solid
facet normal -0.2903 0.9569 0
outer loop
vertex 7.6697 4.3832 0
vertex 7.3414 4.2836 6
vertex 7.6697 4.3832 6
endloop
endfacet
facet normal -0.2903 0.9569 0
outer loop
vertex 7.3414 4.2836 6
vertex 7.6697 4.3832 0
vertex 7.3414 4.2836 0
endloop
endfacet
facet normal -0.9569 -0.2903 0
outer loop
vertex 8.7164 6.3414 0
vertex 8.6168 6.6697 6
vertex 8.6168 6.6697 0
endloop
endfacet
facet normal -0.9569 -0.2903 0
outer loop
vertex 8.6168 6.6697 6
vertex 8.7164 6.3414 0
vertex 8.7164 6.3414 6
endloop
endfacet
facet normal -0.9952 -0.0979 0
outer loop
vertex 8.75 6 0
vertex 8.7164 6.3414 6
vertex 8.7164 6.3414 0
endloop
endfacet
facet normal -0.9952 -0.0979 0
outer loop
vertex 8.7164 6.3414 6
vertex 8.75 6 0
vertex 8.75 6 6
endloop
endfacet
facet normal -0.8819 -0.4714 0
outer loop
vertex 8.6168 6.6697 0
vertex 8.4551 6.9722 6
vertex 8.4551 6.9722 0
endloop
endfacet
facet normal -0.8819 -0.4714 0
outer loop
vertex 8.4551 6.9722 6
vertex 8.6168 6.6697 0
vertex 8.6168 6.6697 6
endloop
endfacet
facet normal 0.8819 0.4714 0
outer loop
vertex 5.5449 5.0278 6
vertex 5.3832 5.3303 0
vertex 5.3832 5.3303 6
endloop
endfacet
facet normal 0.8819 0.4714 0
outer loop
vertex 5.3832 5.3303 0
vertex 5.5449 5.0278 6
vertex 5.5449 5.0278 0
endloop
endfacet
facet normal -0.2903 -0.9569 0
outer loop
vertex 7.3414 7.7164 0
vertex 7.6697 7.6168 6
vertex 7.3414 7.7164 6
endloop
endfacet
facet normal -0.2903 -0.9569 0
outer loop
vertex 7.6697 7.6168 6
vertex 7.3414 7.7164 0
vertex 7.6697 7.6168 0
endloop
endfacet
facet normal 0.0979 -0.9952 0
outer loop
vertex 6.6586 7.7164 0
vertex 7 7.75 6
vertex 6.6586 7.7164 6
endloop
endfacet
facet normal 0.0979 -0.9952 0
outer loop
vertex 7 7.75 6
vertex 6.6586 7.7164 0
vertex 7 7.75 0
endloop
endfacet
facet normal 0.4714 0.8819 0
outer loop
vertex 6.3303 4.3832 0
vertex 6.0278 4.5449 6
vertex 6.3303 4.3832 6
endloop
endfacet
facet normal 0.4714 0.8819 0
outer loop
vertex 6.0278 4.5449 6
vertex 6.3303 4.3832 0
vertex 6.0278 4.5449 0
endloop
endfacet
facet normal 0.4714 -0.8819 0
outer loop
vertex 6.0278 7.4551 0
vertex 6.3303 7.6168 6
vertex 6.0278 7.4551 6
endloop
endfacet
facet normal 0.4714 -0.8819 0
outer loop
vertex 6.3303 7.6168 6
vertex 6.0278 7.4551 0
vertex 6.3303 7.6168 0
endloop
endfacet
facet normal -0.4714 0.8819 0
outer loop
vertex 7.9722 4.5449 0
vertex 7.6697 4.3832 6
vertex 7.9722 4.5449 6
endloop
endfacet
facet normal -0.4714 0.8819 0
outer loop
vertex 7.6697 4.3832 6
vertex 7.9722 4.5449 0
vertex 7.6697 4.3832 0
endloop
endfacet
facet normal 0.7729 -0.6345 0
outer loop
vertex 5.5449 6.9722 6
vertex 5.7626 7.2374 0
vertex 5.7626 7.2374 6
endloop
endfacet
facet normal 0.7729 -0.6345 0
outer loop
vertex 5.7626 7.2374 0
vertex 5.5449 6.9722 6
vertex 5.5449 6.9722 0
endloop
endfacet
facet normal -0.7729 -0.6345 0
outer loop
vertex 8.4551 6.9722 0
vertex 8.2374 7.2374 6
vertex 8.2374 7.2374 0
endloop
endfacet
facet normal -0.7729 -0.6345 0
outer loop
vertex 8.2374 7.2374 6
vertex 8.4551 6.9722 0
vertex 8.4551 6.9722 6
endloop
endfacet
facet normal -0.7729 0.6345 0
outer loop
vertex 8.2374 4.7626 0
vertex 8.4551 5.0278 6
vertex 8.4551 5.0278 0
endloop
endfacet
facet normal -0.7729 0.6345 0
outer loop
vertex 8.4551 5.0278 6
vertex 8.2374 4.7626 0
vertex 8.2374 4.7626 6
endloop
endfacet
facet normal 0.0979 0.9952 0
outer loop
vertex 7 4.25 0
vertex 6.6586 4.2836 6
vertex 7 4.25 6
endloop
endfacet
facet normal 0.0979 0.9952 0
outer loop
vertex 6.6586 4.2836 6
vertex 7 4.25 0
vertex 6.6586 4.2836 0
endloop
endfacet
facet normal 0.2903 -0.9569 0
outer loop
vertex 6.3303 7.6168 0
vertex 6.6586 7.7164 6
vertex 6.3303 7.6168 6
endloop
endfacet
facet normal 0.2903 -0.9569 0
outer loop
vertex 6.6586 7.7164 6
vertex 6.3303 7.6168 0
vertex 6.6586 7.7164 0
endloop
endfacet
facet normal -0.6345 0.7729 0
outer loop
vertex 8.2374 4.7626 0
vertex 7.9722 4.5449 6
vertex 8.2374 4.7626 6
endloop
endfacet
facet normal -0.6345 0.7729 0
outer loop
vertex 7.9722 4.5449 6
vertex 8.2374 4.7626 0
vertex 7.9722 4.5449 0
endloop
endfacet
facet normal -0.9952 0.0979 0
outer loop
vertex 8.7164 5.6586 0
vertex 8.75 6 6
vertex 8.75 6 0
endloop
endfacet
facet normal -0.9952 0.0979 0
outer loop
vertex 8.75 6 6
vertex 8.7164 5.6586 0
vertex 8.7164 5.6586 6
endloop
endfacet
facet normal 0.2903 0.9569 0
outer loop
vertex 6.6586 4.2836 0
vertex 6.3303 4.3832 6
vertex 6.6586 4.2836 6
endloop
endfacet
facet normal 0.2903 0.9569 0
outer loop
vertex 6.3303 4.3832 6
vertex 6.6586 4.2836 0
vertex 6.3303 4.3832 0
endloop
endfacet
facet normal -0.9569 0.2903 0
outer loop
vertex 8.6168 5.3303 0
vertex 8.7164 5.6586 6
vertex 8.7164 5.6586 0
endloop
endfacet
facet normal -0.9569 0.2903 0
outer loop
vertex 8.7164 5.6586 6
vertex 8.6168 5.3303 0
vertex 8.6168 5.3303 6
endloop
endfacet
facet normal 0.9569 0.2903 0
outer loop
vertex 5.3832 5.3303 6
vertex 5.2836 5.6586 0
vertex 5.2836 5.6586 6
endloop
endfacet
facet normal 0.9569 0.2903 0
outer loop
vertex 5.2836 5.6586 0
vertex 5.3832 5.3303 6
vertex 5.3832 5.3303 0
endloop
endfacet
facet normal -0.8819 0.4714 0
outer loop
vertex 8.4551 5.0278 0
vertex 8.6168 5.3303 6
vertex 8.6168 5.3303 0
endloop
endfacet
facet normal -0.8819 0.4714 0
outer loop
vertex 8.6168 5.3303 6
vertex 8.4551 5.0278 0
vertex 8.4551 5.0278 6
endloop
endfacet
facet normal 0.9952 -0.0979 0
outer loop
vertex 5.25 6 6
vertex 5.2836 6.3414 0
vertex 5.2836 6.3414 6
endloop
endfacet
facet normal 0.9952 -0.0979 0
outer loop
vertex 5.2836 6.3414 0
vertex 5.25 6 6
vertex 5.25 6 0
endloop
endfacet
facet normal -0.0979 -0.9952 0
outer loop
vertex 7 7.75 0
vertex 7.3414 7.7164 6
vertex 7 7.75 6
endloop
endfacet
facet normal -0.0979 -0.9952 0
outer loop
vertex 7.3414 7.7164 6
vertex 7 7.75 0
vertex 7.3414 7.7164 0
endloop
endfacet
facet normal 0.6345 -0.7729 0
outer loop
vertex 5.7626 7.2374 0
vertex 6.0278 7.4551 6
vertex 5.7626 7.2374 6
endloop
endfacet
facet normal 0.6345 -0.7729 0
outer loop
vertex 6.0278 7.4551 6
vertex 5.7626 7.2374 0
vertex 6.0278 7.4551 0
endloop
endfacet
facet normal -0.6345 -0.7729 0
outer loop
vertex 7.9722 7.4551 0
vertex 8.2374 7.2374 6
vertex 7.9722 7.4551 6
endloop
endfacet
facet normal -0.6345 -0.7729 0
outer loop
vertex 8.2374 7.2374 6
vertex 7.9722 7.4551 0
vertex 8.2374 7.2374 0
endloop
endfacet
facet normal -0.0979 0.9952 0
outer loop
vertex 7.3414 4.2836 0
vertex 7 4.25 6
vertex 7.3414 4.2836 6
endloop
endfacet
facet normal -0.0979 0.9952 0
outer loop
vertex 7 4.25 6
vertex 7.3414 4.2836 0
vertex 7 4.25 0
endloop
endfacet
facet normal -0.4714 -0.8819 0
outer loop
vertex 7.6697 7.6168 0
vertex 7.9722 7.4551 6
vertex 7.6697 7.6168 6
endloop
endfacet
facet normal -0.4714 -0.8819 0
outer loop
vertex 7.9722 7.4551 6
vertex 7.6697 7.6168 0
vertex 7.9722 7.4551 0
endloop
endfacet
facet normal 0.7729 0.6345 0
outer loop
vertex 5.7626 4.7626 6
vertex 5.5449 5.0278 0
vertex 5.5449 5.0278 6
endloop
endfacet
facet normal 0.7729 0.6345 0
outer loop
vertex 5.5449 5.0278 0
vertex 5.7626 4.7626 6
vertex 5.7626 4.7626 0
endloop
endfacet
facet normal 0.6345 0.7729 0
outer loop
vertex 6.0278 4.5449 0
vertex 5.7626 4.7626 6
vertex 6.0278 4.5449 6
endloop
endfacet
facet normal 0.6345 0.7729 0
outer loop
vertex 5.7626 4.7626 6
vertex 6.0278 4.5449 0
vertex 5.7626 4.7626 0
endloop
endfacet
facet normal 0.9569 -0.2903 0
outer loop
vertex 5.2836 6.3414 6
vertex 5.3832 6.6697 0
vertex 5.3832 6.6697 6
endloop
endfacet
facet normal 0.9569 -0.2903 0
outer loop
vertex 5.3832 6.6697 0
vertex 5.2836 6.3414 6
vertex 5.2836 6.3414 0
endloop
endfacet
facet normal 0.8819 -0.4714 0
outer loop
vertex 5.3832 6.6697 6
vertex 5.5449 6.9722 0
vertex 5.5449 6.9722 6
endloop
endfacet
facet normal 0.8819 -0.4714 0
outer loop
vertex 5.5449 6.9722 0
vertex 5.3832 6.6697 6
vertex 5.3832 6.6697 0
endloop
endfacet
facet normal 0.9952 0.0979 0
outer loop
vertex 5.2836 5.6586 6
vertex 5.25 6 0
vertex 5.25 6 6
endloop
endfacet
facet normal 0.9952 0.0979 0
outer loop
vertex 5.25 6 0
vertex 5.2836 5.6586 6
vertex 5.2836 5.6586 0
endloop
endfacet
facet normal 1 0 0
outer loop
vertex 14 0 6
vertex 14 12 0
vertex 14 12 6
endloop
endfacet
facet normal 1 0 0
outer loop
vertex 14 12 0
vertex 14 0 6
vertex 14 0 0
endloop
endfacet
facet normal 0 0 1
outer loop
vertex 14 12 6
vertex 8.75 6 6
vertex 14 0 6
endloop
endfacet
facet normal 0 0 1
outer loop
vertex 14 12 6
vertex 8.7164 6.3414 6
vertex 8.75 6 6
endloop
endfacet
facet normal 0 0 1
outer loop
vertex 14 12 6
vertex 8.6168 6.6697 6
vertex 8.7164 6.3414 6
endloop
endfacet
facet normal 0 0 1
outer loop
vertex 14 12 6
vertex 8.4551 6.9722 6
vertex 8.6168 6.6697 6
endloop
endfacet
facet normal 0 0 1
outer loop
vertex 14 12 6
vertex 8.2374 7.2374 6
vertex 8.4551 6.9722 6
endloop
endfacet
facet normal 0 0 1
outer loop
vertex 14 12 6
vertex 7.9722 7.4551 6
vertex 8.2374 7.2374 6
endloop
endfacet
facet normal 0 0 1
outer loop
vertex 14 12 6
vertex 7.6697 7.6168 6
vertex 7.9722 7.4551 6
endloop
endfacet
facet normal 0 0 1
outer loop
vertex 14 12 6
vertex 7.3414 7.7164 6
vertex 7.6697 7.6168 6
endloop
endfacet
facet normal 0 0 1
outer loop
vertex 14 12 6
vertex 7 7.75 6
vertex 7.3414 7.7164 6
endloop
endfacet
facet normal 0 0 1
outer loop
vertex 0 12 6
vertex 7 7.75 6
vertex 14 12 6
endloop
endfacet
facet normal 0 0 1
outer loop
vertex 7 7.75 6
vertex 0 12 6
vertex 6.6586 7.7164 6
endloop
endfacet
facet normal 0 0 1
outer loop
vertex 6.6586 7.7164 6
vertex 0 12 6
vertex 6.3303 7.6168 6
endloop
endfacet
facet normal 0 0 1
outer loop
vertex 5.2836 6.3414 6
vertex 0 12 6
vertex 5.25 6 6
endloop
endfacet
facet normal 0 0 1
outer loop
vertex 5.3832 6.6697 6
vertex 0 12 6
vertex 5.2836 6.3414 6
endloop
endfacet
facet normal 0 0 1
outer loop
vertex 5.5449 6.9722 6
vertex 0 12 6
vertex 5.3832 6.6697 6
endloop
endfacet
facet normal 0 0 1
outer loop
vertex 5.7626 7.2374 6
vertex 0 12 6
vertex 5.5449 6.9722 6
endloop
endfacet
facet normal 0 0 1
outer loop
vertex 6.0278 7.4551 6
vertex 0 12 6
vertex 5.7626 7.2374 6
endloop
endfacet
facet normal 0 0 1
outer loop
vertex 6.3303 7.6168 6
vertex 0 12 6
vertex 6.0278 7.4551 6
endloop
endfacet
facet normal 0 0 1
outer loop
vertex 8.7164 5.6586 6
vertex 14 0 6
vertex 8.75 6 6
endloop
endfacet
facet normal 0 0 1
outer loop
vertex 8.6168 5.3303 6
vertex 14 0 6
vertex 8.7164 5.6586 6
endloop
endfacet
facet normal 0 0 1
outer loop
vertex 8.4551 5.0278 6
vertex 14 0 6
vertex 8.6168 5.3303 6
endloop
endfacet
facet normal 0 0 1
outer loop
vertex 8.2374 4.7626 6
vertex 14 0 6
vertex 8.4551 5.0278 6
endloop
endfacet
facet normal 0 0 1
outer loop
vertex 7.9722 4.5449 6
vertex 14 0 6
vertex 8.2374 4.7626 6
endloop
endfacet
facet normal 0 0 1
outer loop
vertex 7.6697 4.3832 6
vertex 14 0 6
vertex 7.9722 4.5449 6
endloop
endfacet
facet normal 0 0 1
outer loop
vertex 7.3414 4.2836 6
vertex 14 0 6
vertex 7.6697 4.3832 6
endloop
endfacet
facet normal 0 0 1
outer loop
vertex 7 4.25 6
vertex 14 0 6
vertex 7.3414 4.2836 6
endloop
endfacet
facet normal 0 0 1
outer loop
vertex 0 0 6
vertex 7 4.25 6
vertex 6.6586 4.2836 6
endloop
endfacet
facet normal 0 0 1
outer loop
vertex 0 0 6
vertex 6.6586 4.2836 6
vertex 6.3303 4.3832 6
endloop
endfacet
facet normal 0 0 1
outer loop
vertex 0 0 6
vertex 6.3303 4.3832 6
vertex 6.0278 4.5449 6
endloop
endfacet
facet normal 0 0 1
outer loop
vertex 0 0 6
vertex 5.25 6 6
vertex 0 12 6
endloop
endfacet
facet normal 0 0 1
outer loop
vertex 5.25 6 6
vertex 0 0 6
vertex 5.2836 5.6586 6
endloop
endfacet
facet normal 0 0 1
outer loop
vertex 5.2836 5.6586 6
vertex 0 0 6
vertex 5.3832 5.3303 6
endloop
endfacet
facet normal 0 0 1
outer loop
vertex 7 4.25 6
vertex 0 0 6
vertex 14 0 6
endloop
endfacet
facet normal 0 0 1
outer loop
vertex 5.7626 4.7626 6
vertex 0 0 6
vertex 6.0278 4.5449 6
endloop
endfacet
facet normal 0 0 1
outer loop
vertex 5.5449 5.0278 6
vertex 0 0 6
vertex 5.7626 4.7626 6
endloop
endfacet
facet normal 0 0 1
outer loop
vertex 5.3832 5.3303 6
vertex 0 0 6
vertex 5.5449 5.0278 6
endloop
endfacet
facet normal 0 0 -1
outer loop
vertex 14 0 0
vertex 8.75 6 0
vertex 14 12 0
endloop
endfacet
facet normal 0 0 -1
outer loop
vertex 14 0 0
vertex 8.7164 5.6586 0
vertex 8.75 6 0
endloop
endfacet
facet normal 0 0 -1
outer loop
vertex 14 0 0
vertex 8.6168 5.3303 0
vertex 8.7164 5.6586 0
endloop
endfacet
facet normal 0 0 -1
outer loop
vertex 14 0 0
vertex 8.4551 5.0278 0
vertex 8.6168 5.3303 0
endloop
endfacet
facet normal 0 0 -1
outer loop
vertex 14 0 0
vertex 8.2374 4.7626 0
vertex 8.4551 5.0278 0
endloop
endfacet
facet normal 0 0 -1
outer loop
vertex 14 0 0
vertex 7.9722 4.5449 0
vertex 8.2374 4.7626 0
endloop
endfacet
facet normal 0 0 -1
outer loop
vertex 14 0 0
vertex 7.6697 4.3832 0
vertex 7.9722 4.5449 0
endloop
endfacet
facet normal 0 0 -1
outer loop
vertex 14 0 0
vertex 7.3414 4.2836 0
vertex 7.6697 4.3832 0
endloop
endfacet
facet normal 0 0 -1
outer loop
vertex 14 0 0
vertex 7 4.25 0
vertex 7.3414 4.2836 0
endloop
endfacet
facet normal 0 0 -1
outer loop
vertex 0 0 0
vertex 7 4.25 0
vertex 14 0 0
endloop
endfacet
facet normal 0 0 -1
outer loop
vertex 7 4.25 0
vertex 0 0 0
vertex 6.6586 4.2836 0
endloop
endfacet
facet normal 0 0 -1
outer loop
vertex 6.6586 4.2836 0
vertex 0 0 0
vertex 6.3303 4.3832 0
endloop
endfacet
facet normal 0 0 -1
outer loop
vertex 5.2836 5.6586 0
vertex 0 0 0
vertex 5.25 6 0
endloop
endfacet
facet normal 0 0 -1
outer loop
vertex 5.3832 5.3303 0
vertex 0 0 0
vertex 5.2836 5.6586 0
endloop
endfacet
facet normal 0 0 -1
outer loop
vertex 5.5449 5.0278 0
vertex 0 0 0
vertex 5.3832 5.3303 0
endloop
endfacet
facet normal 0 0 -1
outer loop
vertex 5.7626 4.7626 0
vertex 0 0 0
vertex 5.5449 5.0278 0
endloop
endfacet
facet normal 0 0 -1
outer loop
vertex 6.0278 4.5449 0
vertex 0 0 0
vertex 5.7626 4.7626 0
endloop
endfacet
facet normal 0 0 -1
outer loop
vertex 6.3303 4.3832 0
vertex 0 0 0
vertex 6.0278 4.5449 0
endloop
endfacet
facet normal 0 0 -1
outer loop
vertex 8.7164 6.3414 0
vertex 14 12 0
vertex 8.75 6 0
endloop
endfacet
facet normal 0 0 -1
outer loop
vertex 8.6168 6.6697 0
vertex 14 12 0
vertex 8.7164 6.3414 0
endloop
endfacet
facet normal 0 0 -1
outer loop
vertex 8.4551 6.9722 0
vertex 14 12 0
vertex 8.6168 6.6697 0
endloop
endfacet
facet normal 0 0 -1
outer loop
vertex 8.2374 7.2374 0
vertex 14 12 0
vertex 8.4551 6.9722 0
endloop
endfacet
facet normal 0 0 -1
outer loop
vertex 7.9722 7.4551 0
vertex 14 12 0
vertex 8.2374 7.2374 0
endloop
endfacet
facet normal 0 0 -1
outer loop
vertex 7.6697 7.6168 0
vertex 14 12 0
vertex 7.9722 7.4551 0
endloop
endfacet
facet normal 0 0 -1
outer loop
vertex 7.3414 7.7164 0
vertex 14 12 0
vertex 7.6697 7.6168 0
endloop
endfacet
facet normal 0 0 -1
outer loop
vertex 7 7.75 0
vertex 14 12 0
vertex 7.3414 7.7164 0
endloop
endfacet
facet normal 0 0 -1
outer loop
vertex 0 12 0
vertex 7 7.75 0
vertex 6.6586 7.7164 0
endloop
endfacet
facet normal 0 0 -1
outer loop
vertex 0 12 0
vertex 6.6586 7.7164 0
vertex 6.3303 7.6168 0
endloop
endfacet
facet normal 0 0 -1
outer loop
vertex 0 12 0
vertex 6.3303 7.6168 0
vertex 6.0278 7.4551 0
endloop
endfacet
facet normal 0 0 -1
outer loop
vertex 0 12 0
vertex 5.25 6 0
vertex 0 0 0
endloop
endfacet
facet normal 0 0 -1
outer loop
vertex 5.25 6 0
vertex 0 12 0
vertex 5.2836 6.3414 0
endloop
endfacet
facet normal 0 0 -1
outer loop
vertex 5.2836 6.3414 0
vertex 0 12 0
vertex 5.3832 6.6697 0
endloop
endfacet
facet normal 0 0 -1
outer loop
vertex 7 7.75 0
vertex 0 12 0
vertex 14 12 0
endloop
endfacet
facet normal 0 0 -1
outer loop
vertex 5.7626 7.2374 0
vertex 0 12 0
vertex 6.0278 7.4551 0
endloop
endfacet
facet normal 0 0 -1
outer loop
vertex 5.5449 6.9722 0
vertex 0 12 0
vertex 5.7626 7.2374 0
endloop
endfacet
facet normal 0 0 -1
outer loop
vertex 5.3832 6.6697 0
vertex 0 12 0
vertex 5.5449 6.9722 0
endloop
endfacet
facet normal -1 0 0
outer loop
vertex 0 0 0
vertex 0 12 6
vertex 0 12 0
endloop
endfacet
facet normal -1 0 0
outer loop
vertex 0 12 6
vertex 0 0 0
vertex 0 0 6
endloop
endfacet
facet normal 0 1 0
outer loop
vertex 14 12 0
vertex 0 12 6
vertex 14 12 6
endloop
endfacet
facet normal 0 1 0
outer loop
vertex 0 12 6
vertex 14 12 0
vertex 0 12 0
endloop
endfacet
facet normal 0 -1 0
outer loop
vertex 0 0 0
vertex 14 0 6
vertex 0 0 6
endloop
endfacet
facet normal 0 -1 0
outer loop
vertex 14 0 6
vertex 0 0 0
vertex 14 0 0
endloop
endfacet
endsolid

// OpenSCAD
$fn = 32;

// ----------------------------------------------------------------------
// Micro pad: two-hole pad, 5-20 mm class
// ----------------------------------------------------------------------

// --- parameters (mm) ---
pad_l = 14;               // pad length, X
pad_w = 12;               // pad width, Y
pad_t = 6;                // pad thickness, Z
hole_d = 3.5;             // hole diameter
hole_x = 7;               // X of the first hole centre
fit_tol = 0.1;            // tolerance for press fits, mm
free_tol = 0.5;           // tolerance for clearance fits, mm

difference() {
  cube([pad_l, pad_w, pad_t]);
  for (x = [hole_x, pad_l - hole_x])
    translate([x, pad_w / 2, -1])
      cylinder(h = pad_t + 2, d = hole_d);
}
